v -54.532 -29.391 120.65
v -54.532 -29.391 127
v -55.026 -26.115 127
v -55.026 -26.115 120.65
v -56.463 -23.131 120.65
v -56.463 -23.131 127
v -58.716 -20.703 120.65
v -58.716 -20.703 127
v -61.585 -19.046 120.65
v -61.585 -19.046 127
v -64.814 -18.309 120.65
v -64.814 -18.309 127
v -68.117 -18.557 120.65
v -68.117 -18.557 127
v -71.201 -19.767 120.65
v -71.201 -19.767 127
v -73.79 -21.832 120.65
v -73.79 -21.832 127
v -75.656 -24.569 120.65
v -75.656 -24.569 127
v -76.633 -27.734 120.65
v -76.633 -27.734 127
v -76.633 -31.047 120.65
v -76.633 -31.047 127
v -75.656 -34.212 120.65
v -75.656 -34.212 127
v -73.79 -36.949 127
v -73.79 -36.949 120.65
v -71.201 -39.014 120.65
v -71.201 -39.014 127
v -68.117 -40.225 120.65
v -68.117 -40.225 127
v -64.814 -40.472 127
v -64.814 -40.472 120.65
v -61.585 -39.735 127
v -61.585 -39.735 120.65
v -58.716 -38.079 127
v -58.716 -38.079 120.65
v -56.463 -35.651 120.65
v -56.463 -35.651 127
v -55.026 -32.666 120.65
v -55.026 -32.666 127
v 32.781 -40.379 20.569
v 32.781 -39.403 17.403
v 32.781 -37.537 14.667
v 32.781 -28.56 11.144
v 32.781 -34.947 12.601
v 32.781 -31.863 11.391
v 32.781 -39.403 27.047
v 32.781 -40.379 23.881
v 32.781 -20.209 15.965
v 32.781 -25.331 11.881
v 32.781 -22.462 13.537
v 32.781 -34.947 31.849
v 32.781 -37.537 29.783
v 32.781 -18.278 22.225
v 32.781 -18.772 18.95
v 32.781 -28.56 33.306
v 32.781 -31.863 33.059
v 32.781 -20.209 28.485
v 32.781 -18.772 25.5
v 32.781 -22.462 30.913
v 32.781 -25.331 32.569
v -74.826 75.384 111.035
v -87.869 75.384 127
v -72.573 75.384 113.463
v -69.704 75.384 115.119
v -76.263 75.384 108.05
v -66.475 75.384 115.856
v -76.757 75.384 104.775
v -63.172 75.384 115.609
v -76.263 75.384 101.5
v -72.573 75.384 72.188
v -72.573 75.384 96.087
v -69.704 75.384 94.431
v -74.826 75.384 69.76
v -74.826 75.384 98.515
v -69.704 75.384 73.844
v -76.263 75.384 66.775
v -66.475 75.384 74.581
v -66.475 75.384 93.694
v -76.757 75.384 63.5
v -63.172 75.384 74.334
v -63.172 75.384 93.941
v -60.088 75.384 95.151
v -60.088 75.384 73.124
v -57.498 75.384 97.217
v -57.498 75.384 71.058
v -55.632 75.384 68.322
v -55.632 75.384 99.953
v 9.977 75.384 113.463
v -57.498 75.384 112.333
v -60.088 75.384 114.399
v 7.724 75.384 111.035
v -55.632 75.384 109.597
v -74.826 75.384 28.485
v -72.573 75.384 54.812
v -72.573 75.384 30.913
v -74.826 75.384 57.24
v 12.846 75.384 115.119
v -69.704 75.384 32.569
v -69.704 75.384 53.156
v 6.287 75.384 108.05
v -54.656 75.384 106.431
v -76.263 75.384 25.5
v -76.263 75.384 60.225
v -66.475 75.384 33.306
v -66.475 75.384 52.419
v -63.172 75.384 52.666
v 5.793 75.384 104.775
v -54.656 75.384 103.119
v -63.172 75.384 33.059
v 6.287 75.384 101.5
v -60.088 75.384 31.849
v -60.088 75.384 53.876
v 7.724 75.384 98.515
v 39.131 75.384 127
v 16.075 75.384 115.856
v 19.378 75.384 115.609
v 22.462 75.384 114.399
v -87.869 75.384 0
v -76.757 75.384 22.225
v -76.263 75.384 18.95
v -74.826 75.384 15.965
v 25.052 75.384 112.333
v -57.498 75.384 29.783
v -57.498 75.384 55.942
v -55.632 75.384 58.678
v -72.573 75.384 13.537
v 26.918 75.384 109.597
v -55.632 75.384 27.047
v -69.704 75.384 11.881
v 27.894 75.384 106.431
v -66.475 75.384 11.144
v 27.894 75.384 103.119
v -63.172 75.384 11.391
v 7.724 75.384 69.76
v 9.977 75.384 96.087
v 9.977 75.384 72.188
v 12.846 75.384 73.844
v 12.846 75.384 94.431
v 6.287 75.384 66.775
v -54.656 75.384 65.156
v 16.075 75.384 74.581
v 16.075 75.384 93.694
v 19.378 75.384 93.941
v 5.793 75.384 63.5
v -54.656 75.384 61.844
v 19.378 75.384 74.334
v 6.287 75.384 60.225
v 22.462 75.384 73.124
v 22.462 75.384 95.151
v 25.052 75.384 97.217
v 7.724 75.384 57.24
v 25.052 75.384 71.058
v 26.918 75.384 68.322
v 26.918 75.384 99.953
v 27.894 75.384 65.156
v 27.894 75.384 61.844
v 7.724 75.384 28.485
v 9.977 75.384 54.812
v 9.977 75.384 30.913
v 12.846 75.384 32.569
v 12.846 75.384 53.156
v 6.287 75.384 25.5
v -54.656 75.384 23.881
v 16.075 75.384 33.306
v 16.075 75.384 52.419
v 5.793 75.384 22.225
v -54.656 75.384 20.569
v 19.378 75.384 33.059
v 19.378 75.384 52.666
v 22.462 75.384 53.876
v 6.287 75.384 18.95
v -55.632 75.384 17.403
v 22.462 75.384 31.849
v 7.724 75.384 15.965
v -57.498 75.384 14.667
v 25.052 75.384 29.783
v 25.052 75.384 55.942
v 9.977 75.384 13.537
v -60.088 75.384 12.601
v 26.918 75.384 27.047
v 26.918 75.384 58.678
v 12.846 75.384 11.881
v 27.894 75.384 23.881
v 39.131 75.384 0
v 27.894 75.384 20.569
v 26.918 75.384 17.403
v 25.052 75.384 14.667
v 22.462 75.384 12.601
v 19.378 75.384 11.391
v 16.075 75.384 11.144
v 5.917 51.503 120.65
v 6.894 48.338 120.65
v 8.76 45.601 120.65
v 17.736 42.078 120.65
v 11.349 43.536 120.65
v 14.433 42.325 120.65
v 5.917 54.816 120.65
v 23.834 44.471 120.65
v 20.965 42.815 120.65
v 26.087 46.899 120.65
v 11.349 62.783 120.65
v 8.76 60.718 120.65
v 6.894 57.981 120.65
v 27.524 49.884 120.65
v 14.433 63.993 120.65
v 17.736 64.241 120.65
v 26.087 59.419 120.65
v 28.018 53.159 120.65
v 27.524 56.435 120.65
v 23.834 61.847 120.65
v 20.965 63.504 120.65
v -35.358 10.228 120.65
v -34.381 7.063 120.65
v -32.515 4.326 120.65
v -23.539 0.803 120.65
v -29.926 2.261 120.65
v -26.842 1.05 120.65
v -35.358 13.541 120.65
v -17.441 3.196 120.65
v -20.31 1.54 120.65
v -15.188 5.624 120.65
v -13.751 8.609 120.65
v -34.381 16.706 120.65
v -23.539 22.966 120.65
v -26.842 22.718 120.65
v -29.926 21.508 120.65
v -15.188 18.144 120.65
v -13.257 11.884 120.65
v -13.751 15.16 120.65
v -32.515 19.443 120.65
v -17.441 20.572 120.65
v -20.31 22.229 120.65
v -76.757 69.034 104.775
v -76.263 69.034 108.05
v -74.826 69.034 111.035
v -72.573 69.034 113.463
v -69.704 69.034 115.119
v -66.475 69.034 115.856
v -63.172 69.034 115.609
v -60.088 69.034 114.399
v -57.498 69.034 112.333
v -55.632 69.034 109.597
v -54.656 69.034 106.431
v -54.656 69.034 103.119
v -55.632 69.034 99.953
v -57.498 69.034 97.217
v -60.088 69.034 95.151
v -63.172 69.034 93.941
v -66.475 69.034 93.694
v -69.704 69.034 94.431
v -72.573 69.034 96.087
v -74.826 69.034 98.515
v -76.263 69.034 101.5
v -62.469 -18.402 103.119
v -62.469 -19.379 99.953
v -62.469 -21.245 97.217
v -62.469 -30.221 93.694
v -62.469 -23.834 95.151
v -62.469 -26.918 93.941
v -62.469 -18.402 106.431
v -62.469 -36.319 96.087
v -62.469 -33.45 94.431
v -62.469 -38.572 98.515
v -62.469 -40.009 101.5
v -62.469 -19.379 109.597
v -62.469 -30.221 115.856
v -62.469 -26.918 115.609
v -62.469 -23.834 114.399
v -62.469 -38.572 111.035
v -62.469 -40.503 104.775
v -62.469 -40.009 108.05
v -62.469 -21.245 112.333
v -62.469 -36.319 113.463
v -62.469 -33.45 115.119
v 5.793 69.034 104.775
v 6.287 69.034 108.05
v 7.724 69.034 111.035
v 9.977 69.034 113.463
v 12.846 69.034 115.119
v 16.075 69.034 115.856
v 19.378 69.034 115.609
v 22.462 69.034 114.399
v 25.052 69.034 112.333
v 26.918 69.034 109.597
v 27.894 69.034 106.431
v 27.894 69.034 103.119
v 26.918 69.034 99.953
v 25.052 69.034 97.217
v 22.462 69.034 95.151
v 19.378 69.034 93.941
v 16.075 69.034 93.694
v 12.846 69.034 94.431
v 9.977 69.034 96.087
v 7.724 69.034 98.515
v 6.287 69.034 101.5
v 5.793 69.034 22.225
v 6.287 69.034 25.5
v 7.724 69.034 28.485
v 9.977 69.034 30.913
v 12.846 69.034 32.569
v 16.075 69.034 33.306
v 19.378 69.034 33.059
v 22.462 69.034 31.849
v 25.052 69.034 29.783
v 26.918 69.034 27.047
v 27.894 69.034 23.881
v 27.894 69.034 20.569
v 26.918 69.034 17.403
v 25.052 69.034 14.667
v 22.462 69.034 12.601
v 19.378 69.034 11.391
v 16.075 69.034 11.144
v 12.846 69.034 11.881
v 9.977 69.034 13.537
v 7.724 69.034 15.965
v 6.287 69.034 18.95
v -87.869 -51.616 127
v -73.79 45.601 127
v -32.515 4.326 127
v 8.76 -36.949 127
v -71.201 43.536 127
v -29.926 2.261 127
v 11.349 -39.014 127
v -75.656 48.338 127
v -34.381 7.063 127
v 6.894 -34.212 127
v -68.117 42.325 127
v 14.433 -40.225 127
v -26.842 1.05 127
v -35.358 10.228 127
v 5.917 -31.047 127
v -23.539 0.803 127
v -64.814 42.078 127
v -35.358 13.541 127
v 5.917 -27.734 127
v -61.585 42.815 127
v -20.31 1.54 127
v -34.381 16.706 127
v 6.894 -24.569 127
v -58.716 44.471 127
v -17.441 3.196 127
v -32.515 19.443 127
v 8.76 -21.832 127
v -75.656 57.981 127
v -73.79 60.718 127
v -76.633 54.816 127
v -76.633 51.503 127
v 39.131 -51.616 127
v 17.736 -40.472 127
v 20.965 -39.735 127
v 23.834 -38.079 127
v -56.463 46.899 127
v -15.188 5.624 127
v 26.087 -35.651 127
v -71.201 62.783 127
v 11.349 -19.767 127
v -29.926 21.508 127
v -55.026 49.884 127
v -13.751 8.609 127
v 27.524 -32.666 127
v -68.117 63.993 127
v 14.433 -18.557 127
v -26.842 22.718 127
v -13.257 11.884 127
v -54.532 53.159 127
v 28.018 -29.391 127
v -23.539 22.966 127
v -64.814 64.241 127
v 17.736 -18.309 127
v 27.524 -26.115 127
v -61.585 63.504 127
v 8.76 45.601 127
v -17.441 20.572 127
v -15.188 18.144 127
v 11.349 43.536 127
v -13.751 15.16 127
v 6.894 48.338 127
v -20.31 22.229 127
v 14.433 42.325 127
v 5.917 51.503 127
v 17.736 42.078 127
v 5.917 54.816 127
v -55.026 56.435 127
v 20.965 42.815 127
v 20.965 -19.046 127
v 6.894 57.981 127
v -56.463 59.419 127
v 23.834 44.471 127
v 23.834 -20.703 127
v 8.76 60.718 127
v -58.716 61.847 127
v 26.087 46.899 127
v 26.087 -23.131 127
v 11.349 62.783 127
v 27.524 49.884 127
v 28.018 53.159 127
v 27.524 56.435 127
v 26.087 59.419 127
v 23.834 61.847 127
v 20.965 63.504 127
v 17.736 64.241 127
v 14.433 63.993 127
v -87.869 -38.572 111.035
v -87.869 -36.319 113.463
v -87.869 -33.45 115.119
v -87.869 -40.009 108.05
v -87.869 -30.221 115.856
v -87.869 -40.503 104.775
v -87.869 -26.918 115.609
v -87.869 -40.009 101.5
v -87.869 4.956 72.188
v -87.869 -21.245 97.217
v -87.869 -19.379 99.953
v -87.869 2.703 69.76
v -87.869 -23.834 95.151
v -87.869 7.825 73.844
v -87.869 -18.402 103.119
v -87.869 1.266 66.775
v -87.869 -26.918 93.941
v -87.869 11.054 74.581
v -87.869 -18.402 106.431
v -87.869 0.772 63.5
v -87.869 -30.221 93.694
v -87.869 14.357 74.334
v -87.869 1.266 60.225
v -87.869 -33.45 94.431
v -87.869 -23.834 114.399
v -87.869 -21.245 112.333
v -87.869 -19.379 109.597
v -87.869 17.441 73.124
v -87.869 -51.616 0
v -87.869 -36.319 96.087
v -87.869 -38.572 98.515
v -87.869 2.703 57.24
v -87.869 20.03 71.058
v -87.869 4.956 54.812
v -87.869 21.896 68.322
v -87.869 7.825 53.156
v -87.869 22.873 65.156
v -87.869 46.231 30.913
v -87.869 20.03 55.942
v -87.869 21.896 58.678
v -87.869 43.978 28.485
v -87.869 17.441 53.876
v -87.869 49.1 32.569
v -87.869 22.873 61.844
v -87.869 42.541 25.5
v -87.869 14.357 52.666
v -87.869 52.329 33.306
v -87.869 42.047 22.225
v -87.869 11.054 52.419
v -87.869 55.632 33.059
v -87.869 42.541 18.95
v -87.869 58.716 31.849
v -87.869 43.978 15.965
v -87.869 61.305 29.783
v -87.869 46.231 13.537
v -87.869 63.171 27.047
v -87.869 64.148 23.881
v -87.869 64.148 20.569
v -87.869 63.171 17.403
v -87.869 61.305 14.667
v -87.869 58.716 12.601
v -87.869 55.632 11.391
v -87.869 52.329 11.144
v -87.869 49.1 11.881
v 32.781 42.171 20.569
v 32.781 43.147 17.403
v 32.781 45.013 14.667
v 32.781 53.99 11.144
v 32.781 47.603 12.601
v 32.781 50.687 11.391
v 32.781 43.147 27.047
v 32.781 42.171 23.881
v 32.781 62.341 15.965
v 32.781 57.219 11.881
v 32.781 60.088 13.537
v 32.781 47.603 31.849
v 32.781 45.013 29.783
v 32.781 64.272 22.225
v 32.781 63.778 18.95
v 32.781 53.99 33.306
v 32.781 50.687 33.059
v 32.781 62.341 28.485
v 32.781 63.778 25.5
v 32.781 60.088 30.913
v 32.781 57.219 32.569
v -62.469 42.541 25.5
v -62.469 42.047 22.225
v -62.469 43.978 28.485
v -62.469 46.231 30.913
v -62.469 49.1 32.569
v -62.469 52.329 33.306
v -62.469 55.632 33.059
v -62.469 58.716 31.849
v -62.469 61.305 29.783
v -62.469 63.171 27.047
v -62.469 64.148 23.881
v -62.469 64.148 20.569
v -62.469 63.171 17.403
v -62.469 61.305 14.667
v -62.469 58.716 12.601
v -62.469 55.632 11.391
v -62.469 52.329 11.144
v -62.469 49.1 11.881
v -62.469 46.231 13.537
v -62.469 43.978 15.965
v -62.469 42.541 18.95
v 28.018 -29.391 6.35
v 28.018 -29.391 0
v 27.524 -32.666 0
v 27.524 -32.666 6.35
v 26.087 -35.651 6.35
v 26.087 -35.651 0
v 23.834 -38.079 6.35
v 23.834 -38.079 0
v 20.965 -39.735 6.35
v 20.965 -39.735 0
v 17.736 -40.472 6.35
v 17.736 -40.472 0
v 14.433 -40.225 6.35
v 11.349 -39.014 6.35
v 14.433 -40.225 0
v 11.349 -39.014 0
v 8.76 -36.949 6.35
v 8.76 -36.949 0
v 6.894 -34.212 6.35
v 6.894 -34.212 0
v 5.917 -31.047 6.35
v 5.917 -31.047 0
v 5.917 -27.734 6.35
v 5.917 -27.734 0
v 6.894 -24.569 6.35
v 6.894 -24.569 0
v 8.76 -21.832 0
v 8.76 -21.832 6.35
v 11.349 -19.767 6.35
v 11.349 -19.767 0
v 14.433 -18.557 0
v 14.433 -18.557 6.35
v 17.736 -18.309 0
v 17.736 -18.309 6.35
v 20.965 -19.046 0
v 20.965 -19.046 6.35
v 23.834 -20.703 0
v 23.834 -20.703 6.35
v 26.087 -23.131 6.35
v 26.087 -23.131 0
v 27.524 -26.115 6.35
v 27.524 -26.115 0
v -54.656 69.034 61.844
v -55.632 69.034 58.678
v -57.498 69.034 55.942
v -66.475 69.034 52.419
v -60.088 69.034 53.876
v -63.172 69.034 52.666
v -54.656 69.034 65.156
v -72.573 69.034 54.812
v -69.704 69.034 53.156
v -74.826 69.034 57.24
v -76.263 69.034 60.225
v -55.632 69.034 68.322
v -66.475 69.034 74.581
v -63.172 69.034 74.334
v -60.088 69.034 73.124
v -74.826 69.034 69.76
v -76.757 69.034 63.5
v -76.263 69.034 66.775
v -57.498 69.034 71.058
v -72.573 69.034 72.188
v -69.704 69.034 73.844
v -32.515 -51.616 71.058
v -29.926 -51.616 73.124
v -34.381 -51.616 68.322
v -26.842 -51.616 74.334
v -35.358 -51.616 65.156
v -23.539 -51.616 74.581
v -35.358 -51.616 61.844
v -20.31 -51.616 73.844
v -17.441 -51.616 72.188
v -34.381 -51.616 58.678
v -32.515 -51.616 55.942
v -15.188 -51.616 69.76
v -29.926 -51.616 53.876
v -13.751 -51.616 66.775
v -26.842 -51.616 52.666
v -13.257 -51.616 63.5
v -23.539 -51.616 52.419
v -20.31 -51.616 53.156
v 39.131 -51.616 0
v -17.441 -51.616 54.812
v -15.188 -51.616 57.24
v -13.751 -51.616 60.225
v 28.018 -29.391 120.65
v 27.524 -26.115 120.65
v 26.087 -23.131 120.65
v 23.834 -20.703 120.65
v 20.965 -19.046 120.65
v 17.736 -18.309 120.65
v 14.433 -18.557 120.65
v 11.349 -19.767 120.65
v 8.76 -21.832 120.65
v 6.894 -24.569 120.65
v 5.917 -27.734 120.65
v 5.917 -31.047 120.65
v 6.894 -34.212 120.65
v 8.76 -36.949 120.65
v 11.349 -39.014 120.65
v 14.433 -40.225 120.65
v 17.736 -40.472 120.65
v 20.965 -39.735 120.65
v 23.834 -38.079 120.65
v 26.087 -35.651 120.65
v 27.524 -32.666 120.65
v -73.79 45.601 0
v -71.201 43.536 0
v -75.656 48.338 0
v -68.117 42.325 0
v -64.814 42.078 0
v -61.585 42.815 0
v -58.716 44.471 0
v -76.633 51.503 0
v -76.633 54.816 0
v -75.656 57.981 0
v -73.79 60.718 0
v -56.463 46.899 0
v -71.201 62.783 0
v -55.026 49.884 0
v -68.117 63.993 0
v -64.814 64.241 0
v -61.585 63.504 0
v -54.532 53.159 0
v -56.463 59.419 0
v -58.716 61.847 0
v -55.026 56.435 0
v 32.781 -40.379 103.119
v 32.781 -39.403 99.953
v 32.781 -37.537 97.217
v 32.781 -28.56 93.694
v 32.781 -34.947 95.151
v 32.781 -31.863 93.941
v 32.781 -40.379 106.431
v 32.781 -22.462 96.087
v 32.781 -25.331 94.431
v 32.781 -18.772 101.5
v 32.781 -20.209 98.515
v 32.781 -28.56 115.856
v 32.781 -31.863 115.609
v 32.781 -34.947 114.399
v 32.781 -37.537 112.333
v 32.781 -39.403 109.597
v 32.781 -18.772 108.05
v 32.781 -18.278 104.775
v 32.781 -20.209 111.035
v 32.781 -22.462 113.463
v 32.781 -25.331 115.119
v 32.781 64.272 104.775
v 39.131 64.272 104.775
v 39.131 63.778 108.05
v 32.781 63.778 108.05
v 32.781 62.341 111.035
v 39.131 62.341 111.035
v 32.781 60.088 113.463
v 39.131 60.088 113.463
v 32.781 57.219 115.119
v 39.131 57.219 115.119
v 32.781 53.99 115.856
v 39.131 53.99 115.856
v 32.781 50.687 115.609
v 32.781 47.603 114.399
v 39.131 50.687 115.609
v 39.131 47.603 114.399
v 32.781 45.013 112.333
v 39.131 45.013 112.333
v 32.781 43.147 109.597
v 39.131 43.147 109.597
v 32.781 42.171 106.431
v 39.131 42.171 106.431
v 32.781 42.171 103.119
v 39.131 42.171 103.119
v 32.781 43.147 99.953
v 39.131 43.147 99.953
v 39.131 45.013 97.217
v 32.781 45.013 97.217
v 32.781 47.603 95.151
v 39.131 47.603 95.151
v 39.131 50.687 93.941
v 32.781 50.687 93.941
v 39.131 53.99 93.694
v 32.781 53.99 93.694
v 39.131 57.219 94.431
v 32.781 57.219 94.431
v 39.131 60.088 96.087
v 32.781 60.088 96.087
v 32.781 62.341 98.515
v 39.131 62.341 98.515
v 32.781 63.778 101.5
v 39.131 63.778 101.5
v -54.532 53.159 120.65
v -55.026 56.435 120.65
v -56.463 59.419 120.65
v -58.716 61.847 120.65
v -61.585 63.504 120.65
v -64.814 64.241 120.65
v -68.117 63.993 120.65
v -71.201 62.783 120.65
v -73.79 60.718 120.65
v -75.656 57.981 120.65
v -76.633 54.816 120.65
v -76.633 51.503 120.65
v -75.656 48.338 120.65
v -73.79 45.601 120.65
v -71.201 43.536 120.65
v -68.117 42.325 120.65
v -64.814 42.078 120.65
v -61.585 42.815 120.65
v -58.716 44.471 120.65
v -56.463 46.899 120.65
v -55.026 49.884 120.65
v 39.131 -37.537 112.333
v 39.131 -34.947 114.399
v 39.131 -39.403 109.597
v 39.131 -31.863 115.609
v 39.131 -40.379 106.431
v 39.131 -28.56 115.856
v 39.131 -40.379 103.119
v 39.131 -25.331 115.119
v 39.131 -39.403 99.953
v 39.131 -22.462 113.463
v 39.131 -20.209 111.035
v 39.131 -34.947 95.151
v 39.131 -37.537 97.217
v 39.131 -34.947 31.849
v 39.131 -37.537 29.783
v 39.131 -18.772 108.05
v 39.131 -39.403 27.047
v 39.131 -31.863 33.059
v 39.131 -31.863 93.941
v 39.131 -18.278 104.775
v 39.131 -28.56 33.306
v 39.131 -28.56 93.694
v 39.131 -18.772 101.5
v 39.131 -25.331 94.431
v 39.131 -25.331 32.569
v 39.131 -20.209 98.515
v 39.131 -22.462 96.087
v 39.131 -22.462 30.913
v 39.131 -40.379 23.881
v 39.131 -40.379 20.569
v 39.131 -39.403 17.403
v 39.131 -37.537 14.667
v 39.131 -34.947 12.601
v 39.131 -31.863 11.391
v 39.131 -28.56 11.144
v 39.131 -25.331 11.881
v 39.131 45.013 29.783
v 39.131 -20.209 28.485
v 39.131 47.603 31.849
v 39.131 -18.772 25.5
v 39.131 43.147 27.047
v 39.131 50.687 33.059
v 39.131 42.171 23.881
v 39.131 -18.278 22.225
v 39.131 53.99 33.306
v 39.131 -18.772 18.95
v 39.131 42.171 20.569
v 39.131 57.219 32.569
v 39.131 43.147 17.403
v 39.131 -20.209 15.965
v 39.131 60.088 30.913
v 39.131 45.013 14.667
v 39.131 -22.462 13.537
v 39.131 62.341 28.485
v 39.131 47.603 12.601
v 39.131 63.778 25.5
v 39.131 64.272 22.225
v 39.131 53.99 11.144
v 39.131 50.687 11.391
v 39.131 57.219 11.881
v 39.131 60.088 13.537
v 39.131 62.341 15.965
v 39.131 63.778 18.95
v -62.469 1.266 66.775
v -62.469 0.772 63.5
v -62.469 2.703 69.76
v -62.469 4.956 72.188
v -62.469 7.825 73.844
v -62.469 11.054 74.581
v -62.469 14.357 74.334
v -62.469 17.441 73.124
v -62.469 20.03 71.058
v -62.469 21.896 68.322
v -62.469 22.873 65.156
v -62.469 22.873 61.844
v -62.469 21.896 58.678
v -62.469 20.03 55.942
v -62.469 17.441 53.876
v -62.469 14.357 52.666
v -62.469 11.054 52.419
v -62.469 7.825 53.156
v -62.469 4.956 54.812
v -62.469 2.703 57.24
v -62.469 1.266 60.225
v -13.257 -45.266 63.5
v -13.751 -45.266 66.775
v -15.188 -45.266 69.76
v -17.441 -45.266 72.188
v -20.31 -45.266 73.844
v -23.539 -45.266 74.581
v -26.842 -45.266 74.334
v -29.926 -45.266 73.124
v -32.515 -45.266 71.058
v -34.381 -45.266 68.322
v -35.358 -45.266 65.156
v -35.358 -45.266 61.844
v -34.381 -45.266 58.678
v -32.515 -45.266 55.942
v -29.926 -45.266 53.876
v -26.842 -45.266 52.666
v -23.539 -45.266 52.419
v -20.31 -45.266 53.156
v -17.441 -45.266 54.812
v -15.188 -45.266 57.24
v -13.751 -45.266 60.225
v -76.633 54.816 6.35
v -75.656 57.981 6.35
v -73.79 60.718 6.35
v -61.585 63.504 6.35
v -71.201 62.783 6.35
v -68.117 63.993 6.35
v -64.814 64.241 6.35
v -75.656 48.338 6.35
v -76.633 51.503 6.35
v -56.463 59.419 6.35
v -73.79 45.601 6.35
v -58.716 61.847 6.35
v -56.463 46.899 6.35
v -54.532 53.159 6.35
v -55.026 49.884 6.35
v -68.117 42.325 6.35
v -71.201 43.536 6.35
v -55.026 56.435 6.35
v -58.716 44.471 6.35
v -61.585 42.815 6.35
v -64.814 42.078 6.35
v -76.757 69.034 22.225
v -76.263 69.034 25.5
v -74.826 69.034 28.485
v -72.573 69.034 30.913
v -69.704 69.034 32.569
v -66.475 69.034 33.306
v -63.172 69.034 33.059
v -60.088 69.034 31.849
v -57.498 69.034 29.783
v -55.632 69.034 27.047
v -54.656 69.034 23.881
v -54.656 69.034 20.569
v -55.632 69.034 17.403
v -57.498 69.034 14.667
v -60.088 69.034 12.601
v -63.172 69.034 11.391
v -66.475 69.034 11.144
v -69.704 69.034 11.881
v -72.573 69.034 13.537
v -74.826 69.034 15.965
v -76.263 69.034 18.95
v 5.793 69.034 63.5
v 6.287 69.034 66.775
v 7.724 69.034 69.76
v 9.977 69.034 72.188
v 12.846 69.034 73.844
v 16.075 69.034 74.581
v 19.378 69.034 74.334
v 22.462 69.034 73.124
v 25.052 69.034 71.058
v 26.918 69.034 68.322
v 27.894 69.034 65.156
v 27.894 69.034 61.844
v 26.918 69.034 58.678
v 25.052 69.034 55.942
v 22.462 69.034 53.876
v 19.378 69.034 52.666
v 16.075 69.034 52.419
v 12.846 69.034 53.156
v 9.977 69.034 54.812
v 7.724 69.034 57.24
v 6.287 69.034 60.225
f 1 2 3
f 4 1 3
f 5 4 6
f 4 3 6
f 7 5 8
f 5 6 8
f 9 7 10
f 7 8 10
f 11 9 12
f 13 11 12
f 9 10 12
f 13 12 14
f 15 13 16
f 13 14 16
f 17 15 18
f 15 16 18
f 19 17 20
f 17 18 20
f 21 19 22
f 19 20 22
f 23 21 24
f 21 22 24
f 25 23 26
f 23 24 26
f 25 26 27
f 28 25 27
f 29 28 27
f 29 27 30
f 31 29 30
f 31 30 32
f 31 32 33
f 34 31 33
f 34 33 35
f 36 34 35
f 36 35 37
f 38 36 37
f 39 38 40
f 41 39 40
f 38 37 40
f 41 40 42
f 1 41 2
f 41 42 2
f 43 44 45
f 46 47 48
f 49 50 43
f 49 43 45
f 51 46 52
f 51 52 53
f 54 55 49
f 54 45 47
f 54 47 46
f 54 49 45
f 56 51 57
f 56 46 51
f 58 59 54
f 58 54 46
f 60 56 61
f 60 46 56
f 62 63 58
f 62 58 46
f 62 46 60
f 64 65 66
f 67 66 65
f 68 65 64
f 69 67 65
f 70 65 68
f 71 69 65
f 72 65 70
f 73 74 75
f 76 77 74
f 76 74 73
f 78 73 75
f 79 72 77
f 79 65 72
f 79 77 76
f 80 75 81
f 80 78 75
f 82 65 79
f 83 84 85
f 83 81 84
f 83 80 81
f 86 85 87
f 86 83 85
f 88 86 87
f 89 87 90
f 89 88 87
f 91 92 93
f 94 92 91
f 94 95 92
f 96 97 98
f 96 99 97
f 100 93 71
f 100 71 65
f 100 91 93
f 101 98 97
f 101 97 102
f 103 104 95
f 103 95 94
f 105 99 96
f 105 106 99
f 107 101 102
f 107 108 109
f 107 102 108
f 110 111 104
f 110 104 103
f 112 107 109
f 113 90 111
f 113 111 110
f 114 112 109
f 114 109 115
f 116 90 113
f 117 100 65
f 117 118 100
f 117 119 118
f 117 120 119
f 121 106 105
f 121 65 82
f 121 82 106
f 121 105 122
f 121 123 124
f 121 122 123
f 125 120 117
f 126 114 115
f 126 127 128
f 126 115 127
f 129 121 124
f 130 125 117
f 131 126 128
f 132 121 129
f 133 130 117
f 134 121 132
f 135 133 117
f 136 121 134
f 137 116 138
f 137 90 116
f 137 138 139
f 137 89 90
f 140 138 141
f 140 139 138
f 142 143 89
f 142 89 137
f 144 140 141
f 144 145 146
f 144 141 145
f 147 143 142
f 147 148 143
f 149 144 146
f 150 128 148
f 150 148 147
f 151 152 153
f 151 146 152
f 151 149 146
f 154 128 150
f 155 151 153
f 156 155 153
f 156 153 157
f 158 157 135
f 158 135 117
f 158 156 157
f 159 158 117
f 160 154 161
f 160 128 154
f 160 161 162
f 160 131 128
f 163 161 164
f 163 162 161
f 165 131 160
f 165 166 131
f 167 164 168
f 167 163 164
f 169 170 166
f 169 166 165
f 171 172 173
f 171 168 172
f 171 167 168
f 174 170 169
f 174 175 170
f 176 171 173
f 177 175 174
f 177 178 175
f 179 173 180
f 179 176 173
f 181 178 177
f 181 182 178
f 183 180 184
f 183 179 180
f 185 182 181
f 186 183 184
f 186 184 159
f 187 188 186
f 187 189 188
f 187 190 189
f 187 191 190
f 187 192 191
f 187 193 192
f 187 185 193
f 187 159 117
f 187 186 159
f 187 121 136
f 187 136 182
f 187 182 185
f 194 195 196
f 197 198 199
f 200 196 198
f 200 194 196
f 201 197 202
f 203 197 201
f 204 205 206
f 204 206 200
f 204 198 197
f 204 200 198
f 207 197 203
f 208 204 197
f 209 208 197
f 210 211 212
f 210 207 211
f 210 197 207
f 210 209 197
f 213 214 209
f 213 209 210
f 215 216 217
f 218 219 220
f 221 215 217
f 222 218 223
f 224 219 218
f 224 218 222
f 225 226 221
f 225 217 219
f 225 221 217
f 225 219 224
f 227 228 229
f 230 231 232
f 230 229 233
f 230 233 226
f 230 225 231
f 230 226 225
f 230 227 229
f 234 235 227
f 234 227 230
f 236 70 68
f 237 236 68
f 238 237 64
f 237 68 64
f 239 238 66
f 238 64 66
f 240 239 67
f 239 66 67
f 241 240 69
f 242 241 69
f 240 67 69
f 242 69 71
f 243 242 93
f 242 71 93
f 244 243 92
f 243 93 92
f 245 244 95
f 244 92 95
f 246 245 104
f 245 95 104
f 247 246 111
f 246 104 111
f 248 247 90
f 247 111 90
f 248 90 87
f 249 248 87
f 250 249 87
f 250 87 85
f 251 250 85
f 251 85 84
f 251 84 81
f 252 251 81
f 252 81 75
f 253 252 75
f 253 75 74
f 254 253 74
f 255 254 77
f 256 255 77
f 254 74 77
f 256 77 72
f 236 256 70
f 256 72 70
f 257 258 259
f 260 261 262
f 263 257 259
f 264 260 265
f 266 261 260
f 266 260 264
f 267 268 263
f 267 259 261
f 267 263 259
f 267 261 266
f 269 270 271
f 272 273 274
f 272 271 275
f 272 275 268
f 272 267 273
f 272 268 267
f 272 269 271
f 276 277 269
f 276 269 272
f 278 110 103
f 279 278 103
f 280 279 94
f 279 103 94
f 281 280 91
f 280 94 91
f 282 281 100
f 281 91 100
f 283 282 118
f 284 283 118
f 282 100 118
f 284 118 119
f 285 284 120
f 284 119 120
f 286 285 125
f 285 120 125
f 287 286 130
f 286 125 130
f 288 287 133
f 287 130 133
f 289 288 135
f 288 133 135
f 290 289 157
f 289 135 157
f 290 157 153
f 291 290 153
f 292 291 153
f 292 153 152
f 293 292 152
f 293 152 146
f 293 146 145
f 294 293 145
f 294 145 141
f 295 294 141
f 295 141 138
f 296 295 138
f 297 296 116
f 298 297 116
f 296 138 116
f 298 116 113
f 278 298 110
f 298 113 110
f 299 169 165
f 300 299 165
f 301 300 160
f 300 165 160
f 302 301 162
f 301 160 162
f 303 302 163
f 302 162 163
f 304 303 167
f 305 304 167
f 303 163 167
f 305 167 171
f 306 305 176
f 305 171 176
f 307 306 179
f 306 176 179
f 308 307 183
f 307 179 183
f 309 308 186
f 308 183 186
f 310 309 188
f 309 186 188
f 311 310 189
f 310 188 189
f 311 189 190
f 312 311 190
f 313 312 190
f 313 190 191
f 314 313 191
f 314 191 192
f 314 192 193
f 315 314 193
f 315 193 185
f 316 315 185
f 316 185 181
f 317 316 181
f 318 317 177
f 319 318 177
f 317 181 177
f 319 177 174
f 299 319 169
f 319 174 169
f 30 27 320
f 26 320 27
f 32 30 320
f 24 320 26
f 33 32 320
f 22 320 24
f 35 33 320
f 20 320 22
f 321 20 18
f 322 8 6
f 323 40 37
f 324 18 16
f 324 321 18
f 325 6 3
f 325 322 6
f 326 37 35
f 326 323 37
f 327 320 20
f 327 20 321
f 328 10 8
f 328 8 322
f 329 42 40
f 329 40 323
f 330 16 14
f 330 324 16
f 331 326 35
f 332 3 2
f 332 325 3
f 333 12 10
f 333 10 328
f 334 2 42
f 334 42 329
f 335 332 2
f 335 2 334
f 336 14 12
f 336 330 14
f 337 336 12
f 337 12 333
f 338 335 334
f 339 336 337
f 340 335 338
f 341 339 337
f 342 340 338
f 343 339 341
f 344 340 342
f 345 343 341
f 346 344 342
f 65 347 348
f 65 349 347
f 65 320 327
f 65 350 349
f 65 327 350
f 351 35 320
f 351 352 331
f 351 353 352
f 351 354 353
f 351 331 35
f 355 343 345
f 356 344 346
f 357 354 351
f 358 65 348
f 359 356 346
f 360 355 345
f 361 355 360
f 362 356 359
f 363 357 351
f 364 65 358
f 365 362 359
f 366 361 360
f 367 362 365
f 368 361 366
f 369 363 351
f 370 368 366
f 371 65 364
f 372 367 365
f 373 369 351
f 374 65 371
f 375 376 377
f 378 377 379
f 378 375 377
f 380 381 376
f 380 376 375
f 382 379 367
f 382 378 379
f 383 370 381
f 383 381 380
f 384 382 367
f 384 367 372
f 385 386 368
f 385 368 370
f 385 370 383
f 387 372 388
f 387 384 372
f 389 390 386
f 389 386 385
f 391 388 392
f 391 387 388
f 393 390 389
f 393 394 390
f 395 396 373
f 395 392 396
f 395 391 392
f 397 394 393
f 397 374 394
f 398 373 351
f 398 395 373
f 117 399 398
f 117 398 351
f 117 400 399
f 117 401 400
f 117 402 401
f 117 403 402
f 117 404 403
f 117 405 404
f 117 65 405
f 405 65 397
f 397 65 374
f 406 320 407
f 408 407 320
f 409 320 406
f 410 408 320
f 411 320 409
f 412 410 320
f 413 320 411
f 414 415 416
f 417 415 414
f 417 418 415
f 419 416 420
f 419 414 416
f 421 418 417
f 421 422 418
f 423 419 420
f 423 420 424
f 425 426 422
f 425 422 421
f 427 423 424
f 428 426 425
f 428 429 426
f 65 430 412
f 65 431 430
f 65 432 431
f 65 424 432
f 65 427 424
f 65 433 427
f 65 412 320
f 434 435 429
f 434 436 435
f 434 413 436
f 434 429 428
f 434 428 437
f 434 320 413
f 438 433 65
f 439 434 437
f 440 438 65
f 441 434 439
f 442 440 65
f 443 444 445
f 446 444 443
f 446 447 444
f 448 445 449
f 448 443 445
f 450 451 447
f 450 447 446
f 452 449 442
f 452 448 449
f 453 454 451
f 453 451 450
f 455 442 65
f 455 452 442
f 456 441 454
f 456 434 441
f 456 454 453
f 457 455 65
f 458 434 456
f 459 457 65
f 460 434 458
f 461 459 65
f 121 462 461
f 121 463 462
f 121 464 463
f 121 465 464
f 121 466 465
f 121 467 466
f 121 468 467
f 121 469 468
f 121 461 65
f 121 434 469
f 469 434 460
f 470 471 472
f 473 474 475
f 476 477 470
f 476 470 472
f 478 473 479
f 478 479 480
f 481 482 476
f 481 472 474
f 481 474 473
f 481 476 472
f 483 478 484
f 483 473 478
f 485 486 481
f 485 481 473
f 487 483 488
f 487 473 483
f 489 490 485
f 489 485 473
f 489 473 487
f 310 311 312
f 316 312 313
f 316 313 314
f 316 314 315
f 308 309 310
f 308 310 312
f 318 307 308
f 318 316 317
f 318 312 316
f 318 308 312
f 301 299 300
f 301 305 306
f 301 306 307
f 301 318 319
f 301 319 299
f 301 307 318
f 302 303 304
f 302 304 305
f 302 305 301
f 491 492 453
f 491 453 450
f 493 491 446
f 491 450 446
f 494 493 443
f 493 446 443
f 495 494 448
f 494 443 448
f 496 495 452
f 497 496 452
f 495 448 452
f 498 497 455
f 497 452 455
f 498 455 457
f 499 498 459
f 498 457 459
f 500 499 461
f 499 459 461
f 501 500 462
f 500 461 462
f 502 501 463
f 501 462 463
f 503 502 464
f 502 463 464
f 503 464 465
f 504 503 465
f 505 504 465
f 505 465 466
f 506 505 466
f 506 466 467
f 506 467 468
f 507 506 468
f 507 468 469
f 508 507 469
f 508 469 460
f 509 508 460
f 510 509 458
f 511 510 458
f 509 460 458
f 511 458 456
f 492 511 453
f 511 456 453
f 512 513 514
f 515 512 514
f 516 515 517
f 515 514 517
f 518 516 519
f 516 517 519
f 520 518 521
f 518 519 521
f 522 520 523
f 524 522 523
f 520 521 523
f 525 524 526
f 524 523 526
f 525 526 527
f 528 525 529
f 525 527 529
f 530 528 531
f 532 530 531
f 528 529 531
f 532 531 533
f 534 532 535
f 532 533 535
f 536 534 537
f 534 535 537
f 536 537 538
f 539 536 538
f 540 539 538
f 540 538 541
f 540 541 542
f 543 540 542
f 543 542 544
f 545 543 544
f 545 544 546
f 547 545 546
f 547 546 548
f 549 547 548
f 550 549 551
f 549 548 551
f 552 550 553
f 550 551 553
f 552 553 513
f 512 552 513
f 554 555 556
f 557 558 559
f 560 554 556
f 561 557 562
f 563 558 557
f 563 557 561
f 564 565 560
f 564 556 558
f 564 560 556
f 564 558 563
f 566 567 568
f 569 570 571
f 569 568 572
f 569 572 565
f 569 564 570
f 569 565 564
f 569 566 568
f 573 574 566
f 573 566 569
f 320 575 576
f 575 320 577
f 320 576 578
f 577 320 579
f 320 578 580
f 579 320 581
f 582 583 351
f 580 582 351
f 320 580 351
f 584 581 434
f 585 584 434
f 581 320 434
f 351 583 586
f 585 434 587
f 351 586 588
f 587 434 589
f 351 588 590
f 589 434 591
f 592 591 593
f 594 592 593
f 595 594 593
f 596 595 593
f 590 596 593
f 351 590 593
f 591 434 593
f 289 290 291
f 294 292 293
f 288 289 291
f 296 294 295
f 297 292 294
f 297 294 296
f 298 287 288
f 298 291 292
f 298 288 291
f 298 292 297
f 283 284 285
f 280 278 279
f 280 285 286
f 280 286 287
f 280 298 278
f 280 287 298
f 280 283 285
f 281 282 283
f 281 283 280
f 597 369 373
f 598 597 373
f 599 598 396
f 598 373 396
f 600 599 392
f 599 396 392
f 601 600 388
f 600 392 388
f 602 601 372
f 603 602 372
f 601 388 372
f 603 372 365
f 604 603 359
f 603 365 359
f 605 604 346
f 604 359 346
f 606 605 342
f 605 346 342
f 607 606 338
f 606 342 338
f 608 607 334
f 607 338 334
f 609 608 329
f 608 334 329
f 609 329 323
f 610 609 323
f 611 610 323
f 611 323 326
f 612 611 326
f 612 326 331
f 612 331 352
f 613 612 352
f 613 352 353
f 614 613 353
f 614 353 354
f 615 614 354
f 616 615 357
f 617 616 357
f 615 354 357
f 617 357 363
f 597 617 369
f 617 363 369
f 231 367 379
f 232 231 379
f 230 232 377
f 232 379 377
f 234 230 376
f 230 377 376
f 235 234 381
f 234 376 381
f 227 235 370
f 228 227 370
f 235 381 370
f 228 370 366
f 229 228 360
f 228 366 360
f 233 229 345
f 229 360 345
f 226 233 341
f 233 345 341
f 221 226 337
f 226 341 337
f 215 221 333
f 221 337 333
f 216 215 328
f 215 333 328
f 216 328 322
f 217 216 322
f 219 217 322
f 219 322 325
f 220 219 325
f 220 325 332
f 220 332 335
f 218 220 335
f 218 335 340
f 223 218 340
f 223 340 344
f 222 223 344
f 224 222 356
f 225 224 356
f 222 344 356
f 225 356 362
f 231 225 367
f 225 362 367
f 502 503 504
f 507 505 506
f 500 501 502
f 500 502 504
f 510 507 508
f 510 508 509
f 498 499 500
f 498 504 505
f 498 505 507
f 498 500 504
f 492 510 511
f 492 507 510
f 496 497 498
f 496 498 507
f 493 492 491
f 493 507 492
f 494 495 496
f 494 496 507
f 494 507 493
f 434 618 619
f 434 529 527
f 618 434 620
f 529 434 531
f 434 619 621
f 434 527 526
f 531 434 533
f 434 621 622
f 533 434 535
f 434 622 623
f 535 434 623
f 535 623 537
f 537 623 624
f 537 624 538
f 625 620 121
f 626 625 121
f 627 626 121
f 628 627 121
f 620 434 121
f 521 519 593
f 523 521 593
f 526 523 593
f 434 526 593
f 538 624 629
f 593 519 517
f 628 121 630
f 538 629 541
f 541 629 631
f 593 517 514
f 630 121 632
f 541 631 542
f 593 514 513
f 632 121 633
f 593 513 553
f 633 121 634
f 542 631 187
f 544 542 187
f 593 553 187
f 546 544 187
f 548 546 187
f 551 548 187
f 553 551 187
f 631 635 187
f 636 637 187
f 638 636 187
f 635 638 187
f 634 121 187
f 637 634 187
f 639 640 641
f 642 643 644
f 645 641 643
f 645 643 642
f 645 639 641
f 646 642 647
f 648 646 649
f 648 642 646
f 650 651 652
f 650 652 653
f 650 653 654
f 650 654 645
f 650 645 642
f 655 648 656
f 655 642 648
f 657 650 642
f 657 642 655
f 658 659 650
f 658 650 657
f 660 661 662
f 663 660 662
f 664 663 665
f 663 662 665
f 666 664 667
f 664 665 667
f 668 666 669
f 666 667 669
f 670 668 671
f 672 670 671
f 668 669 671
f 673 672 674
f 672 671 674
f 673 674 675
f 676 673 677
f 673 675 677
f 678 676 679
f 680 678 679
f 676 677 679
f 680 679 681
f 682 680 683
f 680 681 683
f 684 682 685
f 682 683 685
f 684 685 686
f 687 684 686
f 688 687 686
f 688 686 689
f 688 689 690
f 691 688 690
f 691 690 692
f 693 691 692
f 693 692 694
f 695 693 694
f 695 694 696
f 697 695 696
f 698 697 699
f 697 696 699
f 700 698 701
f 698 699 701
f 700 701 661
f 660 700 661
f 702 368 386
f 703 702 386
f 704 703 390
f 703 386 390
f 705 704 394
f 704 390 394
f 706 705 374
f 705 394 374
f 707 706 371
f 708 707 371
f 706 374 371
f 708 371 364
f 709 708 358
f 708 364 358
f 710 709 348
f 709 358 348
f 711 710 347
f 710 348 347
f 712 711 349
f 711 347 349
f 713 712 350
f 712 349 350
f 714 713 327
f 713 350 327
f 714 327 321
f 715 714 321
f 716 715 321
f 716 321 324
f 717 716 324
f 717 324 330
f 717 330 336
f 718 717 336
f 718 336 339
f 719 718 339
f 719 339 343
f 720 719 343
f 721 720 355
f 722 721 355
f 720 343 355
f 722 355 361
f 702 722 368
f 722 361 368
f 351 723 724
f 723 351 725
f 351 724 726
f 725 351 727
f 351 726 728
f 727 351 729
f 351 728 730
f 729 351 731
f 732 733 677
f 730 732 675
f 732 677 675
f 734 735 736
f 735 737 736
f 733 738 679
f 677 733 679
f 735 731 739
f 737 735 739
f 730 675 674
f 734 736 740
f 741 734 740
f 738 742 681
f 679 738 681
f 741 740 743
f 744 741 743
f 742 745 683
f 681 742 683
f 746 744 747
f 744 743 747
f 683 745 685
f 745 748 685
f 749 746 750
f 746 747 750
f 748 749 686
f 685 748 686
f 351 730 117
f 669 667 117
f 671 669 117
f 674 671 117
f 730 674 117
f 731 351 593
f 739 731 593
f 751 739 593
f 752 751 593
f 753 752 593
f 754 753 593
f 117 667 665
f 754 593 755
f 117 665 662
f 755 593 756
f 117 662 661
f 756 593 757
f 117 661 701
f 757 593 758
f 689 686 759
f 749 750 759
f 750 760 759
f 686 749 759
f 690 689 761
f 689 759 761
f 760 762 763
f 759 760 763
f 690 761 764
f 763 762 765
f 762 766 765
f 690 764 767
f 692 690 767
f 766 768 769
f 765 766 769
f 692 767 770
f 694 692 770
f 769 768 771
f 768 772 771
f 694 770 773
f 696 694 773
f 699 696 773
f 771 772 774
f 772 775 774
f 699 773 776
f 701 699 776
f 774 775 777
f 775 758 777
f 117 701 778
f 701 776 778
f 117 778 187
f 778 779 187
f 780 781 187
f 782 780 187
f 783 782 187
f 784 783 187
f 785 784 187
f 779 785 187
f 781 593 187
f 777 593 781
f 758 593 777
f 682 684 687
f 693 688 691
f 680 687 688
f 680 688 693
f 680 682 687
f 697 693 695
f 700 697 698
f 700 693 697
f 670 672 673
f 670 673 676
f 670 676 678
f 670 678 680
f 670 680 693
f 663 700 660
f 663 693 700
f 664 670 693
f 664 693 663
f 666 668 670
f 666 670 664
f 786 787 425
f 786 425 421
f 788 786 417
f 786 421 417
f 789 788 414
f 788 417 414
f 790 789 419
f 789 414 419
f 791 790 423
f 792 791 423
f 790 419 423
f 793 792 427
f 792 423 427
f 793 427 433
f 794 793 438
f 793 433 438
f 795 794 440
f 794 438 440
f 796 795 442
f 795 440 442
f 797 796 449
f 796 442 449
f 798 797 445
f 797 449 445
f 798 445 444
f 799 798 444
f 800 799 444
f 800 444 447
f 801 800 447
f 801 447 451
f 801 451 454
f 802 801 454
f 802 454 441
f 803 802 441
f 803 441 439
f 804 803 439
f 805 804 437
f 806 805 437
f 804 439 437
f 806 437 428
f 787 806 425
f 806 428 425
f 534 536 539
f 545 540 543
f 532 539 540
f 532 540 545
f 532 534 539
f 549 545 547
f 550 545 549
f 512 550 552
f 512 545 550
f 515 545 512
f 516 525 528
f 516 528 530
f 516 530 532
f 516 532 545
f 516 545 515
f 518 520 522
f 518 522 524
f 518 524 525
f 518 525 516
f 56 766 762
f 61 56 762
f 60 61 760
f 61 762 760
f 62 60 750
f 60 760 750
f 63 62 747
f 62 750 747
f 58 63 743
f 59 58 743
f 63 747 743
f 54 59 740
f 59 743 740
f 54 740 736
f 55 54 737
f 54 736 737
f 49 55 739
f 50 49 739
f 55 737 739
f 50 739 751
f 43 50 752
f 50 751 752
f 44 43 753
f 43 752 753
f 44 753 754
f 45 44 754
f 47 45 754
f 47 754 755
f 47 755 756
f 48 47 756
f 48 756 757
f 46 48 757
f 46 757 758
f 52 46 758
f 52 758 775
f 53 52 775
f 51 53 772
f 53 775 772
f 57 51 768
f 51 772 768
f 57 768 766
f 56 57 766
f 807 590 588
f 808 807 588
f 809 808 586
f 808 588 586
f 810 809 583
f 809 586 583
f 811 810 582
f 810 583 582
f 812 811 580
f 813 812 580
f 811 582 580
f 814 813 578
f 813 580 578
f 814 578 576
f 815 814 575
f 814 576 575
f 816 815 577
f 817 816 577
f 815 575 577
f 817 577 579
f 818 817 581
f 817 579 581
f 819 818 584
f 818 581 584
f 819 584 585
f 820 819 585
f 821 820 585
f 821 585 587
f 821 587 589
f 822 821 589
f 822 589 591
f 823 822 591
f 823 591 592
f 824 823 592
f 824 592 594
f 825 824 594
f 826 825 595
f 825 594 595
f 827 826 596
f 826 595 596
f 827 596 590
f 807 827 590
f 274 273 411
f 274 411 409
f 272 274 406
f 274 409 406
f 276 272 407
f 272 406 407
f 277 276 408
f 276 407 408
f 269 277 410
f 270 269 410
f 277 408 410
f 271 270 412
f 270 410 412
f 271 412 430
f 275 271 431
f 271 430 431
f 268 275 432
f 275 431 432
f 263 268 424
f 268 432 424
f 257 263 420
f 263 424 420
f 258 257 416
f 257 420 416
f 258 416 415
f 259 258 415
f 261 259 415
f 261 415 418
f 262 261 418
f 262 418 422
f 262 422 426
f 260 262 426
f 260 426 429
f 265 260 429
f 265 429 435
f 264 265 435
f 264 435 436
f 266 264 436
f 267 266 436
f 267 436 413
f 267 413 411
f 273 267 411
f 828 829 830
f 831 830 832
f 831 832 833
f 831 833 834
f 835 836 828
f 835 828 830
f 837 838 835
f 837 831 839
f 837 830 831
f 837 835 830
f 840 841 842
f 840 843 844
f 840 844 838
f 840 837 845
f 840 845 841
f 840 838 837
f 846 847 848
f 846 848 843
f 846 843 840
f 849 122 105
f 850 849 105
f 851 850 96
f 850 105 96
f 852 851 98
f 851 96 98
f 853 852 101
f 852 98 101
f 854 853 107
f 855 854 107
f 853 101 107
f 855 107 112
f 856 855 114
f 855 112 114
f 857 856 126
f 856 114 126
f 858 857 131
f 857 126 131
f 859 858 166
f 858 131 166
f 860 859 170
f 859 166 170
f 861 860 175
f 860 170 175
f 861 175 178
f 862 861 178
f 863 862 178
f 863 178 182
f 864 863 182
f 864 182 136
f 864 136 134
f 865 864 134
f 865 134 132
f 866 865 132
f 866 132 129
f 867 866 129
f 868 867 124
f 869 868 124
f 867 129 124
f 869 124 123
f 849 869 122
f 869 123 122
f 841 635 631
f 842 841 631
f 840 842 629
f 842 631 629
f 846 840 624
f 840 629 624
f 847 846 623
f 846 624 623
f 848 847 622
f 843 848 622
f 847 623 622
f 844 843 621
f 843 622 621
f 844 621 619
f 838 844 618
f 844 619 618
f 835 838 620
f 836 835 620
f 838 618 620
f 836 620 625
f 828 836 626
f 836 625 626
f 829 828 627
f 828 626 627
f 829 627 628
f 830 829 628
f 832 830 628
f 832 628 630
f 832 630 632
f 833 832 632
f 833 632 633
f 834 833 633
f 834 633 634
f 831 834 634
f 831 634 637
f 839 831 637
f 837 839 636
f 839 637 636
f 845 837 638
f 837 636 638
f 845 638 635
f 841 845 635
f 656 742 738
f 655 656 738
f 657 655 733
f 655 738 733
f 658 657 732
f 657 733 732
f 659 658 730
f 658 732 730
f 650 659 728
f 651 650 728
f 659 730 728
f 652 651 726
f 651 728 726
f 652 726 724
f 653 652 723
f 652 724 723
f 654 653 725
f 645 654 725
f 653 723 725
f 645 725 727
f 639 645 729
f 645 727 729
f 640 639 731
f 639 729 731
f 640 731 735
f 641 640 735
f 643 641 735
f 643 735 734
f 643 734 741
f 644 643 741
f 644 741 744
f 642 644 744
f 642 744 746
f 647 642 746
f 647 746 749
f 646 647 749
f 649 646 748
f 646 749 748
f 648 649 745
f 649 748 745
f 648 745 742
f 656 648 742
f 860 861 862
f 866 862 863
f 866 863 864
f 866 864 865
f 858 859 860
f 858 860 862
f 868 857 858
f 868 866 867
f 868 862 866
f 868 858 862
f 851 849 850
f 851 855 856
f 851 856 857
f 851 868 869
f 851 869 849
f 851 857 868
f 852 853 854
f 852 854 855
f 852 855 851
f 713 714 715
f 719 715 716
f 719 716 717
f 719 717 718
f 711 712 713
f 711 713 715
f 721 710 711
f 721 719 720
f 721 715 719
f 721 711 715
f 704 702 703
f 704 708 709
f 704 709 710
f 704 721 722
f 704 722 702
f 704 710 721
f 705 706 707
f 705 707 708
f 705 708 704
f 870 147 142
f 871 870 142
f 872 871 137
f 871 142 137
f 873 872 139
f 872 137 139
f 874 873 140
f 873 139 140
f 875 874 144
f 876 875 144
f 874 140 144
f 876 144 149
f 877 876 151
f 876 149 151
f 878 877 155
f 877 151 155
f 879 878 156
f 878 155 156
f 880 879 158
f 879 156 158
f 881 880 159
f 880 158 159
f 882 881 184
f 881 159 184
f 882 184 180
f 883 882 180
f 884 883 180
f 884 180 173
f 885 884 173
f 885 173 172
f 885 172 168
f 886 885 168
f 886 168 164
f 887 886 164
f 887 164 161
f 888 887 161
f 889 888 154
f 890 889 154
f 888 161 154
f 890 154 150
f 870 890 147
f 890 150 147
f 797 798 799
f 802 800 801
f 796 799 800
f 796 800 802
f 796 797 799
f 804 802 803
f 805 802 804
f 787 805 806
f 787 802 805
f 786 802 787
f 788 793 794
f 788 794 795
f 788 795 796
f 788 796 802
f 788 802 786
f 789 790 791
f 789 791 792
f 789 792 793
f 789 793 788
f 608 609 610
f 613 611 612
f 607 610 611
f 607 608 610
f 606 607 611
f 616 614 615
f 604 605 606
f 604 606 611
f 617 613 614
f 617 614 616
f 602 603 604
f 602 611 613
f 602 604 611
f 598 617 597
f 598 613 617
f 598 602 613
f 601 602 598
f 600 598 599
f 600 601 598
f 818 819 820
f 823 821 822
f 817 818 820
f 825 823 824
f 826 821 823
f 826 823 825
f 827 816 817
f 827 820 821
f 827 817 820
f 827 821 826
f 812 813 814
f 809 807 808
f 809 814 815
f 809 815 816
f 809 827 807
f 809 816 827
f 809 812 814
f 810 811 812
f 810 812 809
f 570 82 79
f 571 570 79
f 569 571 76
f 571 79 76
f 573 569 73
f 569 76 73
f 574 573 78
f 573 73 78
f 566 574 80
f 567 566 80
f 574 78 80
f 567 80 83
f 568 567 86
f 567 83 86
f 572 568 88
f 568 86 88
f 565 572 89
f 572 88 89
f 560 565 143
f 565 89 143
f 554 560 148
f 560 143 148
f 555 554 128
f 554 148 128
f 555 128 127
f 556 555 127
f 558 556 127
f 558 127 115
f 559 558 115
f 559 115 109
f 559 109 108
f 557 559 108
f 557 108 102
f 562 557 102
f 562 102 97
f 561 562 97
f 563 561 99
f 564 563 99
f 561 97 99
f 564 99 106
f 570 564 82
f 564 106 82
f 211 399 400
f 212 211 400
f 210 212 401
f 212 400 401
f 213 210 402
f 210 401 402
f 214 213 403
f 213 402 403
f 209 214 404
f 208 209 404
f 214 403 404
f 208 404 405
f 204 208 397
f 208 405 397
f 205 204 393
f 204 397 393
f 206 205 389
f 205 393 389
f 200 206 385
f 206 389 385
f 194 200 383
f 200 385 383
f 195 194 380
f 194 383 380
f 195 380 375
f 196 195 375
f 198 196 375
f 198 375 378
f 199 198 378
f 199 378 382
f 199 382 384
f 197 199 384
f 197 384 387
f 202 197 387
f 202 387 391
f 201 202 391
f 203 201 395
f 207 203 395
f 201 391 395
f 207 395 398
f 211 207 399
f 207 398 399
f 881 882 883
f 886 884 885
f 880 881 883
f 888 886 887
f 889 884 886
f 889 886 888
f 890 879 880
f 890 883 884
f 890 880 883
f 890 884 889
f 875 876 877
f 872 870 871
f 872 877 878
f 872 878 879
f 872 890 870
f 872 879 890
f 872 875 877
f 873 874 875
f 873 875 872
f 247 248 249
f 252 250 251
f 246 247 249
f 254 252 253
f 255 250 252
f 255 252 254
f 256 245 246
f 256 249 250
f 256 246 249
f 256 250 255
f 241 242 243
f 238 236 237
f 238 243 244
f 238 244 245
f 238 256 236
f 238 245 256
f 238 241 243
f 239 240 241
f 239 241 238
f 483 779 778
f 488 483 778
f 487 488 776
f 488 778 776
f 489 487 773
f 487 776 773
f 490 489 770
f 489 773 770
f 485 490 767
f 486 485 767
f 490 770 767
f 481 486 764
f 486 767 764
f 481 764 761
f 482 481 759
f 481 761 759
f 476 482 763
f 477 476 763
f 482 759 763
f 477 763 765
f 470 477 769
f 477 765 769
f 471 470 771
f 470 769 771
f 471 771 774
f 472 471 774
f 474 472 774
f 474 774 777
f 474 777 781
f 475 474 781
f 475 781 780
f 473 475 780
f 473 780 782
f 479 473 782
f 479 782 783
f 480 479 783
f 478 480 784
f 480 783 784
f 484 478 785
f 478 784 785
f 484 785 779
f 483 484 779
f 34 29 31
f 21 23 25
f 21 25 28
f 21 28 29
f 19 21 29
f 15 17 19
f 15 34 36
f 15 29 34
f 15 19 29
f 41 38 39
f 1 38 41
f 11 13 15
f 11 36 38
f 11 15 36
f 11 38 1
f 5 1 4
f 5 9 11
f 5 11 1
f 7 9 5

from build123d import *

# Parameters (mm, degrees)
F0_W      = 127
F0_H      = 127
F1_DEPTH  = 127
F2_R      = 11.1125
F3_DEPTH  = 6.35
F4_R      = 11.1125
F6_DEPTH  = 6.35
F7_DEPTH  = 25.4
F5_R      = 11.1125
F8_DEPTH  = 6.35
F9_DEPTH  = 6.35
F10_R     = 11.1125
F11_DEPTH = 6.35
F13_R     = 11.1125
F14_DEPTH = 6.35
F12_R     = 11.1125
F15_DEPTH = 6.35


with BuildPart() as f1:
    # F0 (on Top) → F1 (new body)
    with BuildSketch(Plane.XY):
        with Locations((-24.36945, 11.884371)):
            Rectangle(F0_W, F0_H)
    extrude(amount=F1_DEPTH)

    # F2 (on face) → F3 (cut)
    with BuildSketch(Plane.XZ.offset(51.615629)):
        with Locations((-24.36945, 63.5)):
            Circle(F2_R)
    extrude(amount=-F3_DEPTH, mode=Mode.SUBTRACT)

    # F4 (on face) → F6 (cut)
    with BuildSketch(Plane(origin=(-87.86945, 0, 0), x_dir=(0, -1, 0), z_dir=(-1, 0, 0))):
        with Locations((29.390629, 104.775)):
            Circle(F4_R)
    extrude(amount=-F6_DEPTH, mode=Mode.SUBTRACT)

    # F4 (on face) → F7 (cut)
    with BuildSketch(Plane(origin=(-87.86945, 0, 0), x_dir=(0, -1, 0), z_dir=(-1, 0, 0))):
        with Locations((-11.884371, 63.5)):
            Circle(F4_R)
        with Locations((29.390629, 104.775)):
            Circle(F4_R)
        with Locations((-53.159371, 22.225)):
            Circle(F4_R)
    extrude(amount=-F7_DEPTH, mode=Mode.SUBTRACT)

    # F5 (on face) → F8 (cut)
    with BuildSketch(Plane.XY.offset(127)):
        with Locations((16.90555, -29.390629)):
            Circle(F5_R)
        with Locations((16.90555, 53.159371)):
            Circle(F5_R)
        with Locations((-65.64445, 53.159371)):
            Circle(F5_R)
        with Locations((-65.64445, -29.390629)):
            Circle(F5_R)
    extrude(amount=-F8_DEPTH, mode=Mode.SUBTRACT)

    # F5 (on face) → F9 (cut)
    with BuildSketch(Plane.XY.offset(127)):
        with Locations((-24.36945, 11.884371)):
            Circle(F5_R)
    extrude(amount=-F9_DEPTH, mode=Mode.SUBTRACT)

    # F10 (on face) → F11 (cut)
    with BuildSketch(Plane(origin=(0, 75.384371, 0), x_dir=(-1, 0, 0), z_dir=(0, 1, 0))):
        with Locations((-16.90555, 104.775)):
            Circle(F10_R)
        with Locations((-16.90555, 63.5)):
            Circle(F10_R)
        with Locations((-16.90555, 22.225)):
            Circle(F10_R)
        with Locations((65.64445, 22.225)):
            Circle(F10_R)
        with Locations((65.64445, 63.5)):
            Circle(F10_R)
        with Locations((65.64445, 104.775)):
            Circle(F10_R)
    extrude(amount=-F11_DEPTH, mode=Mode.SUBTRACT)

    # F13 (on face) → F14 (cut)
    with BuildSketch(Plane.YZ.offset(39.13055)):
        with Locations((53.159371, 104.775)):
            Circle(F13_R)
        with Locations((53.159371, 22.225)):
            Circle(F13_R)
        with Locations((-29.390629, 22.225)):
            Circle(F13_R)
        with Locations((-29.390629, 104.775)):
            Circle(F13_R)
    extrude(amount=-F14_DEPTH, mode=Mode.SUBTRACT)

    # F12 (on face) → F15 (cut)
    with BuildSketch(Plane(origin=(0, 0, 0), x_dir=(1, 0, 0), z_dir=(0, 0, -1))):
        with Locations((-65.64445, -53.159371)):
            Circle(F12_R)
        with Locations((16.90555, 29.390629)):
            Circle(F12_R)
    extrude(amount=-F15_DEPTH, mode=Mode.SUBTRACT)


solid = f1.part
